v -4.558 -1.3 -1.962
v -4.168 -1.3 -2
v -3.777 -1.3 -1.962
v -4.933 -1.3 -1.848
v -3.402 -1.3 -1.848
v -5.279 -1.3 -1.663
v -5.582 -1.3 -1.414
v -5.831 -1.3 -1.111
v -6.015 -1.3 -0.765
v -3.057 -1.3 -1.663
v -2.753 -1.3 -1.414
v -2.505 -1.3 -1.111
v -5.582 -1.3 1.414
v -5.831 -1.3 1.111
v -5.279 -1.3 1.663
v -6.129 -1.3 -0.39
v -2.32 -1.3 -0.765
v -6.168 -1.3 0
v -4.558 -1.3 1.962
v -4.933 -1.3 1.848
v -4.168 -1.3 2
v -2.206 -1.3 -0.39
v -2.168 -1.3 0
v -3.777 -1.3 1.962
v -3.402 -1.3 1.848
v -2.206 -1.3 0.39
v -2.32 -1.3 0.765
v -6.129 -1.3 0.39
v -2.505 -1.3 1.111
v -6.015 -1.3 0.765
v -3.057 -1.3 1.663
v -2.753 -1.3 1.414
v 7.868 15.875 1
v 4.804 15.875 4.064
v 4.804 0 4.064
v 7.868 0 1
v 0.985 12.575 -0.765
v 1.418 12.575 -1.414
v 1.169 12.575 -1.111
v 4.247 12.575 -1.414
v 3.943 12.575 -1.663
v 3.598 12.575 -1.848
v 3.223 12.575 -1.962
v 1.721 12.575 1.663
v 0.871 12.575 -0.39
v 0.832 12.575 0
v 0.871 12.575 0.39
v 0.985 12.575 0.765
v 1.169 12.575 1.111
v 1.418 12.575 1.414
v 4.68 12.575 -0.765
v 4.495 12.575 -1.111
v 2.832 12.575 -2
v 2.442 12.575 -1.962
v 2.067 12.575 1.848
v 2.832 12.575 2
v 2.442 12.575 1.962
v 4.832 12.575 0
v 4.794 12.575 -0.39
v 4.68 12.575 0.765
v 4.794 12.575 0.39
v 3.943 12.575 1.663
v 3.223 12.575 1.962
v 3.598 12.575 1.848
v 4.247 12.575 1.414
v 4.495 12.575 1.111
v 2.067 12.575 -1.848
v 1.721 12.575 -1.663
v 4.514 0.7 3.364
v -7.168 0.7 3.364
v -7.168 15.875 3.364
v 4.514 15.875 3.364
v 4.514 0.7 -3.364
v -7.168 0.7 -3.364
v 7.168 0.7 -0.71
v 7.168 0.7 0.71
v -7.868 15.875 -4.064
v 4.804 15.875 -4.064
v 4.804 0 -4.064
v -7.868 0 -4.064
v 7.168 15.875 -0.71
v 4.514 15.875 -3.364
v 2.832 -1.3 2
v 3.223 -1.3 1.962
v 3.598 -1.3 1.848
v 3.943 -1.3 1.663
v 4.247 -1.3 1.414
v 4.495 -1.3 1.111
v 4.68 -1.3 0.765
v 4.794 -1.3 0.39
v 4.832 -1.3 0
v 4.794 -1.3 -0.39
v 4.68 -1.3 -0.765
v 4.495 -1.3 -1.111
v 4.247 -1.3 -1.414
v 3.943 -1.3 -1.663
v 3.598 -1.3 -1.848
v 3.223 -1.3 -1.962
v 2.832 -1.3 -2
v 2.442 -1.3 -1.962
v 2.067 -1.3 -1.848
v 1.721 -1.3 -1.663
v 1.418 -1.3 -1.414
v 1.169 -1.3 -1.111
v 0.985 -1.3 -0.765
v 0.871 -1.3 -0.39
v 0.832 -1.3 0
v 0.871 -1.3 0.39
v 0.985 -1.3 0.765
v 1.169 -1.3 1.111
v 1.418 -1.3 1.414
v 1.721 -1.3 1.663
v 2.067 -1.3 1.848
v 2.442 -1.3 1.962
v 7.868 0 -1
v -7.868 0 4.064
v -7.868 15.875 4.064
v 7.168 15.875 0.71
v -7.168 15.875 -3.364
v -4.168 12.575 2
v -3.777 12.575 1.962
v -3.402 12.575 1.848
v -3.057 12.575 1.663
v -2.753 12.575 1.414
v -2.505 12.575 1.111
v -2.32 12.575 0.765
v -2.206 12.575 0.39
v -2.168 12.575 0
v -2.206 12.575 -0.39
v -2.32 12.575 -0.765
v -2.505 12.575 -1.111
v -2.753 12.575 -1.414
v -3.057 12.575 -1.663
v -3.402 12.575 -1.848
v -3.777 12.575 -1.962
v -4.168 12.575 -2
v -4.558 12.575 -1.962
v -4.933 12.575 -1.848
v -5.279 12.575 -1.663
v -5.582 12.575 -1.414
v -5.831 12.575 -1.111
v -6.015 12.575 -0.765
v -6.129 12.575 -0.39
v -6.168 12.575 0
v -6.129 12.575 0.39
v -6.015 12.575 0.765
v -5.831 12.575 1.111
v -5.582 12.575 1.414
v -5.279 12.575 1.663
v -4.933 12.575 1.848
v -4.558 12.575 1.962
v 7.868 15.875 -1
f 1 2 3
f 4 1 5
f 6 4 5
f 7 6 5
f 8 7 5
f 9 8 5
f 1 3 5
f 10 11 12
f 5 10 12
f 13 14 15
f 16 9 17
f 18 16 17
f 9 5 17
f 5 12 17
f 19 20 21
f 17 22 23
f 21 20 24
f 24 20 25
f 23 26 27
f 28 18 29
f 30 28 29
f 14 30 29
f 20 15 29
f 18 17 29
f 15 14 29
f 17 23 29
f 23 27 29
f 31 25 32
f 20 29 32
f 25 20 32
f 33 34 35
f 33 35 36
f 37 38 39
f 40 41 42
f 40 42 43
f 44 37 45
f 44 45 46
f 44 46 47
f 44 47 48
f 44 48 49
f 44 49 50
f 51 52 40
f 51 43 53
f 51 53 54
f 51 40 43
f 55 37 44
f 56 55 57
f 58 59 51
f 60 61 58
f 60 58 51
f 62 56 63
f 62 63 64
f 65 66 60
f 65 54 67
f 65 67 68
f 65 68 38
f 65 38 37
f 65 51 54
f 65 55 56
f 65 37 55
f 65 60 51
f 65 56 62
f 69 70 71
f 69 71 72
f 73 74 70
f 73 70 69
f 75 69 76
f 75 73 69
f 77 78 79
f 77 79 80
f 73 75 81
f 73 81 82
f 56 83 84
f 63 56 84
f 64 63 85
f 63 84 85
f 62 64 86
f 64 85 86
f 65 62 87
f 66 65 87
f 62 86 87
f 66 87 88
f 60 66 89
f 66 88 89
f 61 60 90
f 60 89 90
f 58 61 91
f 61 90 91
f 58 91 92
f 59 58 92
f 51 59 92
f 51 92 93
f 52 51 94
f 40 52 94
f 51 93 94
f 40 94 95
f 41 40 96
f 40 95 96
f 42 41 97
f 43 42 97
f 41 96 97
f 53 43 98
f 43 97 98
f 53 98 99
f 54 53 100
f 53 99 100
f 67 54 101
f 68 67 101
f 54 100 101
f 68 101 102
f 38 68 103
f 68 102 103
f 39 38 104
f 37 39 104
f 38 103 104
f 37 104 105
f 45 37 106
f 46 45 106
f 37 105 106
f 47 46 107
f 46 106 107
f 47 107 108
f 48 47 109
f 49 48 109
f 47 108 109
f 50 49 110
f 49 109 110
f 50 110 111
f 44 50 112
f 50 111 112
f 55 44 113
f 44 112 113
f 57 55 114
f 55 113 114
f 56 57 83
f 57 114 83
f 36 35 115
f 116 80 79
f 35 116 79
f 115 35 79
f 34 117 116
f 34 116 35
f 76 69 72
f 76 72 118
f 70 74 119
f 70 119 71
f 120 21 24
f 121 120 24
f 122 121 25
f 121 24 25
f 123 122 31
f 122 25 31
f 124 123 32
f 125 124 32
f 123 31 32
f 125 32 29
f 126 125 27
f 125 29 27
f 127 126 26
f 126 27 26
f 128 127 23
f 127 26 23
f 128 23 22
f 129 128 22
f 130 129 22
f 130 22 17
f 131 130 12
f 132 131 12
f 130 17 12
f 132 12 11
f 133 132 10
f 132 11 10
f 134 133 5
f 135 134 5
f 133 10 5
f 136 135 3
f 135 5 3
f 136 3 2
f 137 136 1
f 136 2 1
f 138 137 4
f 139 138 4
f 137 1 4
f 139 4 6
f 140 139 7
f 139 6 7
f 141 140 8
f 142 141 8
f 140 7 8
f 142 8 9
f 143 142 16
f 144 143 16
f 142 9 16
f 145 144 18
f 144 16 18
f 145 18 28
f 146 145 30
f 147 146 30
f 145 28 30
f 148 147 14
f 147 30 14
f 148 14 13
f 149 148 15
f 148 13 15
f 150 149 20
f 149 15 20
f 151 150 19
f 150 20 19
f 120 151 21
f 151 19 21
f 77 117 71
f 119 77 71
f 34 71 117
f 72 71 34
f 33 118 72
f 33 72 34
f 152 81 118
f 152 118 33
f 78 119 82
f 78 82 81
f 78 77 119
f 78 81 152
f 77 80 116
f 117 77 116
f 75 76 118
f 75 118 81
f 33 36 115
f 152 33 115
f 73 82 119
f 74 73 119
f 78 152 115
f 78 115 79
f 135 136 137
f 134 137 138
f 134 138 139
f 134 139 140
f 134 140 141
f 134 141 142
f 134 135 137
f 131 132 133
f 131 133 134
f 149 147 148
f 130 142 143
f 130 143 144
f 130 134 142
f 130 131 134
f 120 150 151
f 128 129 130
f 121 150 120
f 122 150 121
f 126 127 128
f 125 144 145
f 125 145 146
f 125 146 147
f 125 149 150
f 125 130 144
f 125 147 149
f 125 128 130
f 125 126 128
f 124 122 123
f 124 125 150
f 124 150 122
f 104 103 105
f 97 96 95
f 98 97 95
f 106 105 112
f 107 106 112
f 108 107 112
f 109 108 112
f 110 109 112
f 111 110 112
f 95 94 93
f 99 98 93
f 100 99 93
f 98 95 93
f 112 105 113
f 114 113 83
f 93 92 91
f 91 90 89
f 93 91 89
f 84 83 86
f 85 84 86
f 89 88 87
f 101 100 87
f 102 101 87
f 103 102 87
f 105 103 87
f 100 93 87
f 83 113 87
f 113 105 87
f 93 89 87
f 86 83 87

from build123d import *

# Parameters (mm, degrees)
P_IDAT_VYSUNUT_M1_DEPTH        = 15.875
SKO_EPINA1_T                   = -0.7
P_IDAT_VYSUNUT_M2_DEPTH        = 11.875
P_IDAT_VYSUNUT_M2_DEPTH_BACK   = 2
SKICA2_R                       = 2
P_IDAT_VYSUNUT_M2_2_DEPTH      = 11.875
P_IDAT_VYSUNUT_M2_2_DEPTH_BACK = 2


with BuildPart() as part:
    # Skica1 → Přidat vysunutím1 (new body)
    with BuildSketch(Plane(origin=(0, 0, 0), x_dir=(1, 0, 0), z_dir=(0, 1, 0))):
        Polygon((-7.86765, 4.064), (-7.86765, -4.064), (4.80365, -4.064), (7.86765, -1), (7.86765, 1), (4.80365, 4.064), align=None)
    extrude(amount=P_IDAT_VYSUNUT_M1_DEPTH)

    # Skořepina1
    sko_epina1_openings = [part.faces().sort_by_distance(p)[0] for p in [
        (-0.542357048, 15.875, 0),
    ]]
    offset(amount=SKO_EPINA1_T, openings=sko_epina1_openings, kind=Kind.INTERSECTION)


with BuildPart() as body_2:
    # Skica2 → Přidat vysunutím2 (new, two sides: drawn at the far end of the back side and taken through both)
    with BuildSketch(Plane(origin=(0, 0.7, 0), x_dir=(1, 0, 0), z_dir=(0, 1, 0)).offset(-P_IDAT_VYSUNUT_M2_DEPTH_BACK)):
        with Locations(Location((-4.16765, 0, 0), (0, 0, 270))):
            Circle(SKICA2_R)
    extrude(amount=P_IDAT_VYSUNUT_M2_DEPTH + P_IDAT_VYSUNUT_M2_DEPTH_BACK)


with BuildPart() as body_3:
    # Skica2 → P_idat vysunut_m2 2 (new, two sides: drawn at the far end of the back side and taken through both)
    with BuildSketch(Plane(origin=(0, 0.7, 0), x_dir=(1, 0, 0), z_dir=(0, 1, 0)).offset(-P_IDAT_VYSUNUT_M2_2_DEPTH_BACK)):
        with Locations(Location((2.83235, 0, 0), (0, 0, 270))):
            Circle(SKICA2_R)
    extrude(amount=P_IDAT_VYSUNUT_M2_2_DEPTH + P_IDAT_VYSUNUT_M2_2_DEPTH_BACK)


solid = Compound([part.part, body_2.part, body_3.part])
